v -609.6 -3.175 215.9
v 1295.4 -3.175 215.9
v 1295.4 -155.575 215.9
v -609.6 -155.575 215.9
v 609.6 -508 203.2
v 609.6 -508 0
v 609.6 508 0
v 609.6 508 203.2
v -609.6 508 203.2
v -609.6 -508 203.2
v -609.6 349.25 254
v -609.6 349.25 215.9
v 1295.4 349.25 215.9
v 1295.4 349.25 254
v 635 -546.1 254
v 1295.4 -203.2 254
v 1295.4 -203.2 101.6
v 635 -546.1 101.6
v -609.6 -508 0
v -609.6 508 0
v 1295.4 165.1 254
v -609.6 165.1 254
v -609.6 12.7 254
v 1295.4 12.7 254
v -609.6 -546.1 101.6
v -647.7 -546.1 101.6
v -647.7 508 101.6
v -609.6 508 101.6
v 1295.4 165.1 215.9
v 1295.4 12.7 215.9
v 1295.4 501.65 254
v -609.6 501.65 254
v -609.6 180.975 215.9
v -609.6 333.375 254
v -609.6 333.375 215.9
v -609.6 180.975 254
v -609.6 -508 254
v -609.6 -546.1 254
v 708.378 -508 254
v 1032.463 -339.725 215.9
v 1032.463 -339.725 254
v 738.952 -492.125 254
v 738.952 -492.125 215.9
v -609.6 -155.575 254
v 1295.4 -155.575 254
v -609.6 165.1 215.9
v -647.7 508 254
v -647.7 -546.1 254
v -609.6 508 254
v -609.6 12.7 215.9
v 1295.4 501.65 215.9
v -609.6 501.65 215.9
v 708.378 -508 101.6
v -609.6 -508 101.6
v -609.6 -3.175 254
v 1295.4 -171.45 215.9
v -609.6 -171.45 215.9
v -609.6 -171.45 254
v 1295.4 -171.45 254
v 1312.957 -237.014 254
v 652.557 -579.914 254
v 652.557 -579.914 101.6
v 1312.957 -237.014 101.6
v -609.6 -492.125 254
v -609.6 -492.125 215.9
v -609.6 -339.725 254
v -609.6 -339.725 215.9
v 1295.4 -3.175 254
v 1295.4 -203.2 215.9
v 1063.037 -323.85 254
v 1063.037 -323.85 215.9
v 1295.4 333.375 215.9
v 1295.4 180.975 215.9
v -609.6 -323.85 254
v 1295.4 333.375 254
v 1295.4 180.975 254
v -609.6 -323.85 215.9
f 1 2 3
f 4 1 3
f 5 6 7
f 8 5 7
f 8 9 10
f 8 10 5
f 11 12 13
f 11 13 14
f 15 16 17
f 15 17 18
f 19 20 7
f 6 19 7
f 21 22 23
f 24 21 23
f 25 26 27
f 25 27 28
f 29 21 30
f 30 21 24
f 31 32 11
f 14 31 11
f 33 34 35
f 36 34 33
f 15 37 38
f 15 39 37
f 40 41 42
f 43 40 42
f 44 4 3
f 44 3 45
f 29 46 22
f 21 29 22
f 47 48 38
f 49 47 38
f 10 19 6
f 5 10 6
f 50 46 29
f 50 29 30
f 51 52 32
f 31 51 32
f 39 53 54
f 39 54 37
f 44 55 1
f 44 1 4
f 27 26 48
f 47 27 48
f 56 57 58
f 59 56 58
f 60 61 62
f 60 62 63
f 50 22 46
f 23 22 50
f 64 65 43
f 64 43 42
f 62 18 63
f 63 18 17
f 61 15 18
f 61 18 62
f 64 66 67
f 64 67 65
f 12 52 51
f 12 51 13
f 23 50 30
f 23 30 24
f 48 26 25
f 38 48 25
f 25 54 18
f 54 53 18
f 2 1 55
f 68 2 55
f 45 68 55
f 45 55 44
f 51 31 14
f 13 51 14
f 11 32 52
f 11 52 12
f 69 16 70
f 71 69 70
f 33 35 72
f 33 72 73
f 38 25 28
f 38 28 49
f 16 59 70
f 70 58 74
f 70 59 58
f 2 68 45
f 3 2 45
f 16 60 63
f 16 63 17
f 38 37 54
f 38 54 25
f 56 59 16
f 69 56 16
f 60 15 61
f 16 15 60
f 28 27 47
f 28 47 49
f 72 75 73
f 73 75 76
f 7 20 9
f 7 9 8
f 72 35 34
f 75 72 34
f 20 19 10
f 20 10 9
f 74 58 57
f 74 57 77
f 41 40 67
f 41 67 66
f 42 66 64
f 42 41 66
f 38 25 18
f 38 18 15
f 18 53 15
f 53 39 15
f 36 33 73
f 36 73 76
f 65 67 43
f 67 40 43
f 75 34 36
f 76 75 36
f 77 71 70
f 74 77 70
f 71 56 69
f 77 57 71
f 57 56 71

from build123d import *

# Parameters (mm, degrees)
F0_W     = 1219.2
F0_H     = 1016
F1_DEPTH = 203.2
F2_W     = 38.1
F2_H     = 152.4
F2_W_2   = 152.4
F2_H_2   = 38.1
F3_DEPTH = 1905
F4_W     = 38.1
F4_H     = 152.4
F5_DEPTH = 1054.1
F7_DEPTH = 254.001
F9_DEPTH = 152.4


with BuildPart() as f1:
    # F0 (on Top) → F1 (new body)
    with BuildSketch(Plane.XY):
        Rectangle(F0_W, F0_H)
    extrude(amount=F1_DEPTH)


with BuildPart() as f3:
    # F2 (on face) → F3 (new body)
    with BuildSketch(Plane(origin=(-609.6, 0, 0), x_dir=(0, -1, 0), z_dir=(-1, 0, 0))):
        with Locations((527.05, 177.8)):
            Rectangle(F2_W, F2_H)
        with Locations((415.925, 234.95)):
            Rectangle(F2_W_2, F2_H_2)
        with Locations((247.65, 234.95)):
            Rectangle(F2_W_2, F2_H_2)
        with Locations((79.375, 234.95)):
            Rectangle(F2_W_2, F2_H_2)
        with Locations((-88.9, 234.95)):
            Rectangle(F2_W_2, F2_H_2)
        with Locations((-257.175, 234.95)):
            Rectangle(F2_W_2, F2_H_2)
        with Locations((-425.45, 234.95)):
            Rectangle(F2_W_2, F2_H_2)
    extrude(amount=-F3_DEPTH)

    # F6 (on face) → F7 (cut, through all)
    with BuildSketch(Plane.XY.offset(254)):
        Polygon((1295.4, -203.2), (635, -546.1), (1295.4, -546.1), align=None)
    extrude(amount=-F7_DEPTH, mode=Mode.SUBTRACT)


with BuildPart() as f5:
    # F4 (on face) → F5 (new body)
    with BuildSketch(Plane.XZ.offset(546.1)):
        with Locations((-628.65, 177.8)):
            Rectangle(F4_W, F4_H)
    extrude(amount=-F5_DEPTH)


with BuildPart() as f9:
    # F8 (on face) → F9 (new body)
    with BuildSketch(Plane.XY.offset(254)):
        Polygon((1295.4, -203.2), (635, -546.1), (652.557062, -579.913601), (1312.957062, -237.013601), align=None)
    extrude(amount=-F9_DEPTH)


solid = Compound([f1.part, f3.part, f5.part, f9.part])
